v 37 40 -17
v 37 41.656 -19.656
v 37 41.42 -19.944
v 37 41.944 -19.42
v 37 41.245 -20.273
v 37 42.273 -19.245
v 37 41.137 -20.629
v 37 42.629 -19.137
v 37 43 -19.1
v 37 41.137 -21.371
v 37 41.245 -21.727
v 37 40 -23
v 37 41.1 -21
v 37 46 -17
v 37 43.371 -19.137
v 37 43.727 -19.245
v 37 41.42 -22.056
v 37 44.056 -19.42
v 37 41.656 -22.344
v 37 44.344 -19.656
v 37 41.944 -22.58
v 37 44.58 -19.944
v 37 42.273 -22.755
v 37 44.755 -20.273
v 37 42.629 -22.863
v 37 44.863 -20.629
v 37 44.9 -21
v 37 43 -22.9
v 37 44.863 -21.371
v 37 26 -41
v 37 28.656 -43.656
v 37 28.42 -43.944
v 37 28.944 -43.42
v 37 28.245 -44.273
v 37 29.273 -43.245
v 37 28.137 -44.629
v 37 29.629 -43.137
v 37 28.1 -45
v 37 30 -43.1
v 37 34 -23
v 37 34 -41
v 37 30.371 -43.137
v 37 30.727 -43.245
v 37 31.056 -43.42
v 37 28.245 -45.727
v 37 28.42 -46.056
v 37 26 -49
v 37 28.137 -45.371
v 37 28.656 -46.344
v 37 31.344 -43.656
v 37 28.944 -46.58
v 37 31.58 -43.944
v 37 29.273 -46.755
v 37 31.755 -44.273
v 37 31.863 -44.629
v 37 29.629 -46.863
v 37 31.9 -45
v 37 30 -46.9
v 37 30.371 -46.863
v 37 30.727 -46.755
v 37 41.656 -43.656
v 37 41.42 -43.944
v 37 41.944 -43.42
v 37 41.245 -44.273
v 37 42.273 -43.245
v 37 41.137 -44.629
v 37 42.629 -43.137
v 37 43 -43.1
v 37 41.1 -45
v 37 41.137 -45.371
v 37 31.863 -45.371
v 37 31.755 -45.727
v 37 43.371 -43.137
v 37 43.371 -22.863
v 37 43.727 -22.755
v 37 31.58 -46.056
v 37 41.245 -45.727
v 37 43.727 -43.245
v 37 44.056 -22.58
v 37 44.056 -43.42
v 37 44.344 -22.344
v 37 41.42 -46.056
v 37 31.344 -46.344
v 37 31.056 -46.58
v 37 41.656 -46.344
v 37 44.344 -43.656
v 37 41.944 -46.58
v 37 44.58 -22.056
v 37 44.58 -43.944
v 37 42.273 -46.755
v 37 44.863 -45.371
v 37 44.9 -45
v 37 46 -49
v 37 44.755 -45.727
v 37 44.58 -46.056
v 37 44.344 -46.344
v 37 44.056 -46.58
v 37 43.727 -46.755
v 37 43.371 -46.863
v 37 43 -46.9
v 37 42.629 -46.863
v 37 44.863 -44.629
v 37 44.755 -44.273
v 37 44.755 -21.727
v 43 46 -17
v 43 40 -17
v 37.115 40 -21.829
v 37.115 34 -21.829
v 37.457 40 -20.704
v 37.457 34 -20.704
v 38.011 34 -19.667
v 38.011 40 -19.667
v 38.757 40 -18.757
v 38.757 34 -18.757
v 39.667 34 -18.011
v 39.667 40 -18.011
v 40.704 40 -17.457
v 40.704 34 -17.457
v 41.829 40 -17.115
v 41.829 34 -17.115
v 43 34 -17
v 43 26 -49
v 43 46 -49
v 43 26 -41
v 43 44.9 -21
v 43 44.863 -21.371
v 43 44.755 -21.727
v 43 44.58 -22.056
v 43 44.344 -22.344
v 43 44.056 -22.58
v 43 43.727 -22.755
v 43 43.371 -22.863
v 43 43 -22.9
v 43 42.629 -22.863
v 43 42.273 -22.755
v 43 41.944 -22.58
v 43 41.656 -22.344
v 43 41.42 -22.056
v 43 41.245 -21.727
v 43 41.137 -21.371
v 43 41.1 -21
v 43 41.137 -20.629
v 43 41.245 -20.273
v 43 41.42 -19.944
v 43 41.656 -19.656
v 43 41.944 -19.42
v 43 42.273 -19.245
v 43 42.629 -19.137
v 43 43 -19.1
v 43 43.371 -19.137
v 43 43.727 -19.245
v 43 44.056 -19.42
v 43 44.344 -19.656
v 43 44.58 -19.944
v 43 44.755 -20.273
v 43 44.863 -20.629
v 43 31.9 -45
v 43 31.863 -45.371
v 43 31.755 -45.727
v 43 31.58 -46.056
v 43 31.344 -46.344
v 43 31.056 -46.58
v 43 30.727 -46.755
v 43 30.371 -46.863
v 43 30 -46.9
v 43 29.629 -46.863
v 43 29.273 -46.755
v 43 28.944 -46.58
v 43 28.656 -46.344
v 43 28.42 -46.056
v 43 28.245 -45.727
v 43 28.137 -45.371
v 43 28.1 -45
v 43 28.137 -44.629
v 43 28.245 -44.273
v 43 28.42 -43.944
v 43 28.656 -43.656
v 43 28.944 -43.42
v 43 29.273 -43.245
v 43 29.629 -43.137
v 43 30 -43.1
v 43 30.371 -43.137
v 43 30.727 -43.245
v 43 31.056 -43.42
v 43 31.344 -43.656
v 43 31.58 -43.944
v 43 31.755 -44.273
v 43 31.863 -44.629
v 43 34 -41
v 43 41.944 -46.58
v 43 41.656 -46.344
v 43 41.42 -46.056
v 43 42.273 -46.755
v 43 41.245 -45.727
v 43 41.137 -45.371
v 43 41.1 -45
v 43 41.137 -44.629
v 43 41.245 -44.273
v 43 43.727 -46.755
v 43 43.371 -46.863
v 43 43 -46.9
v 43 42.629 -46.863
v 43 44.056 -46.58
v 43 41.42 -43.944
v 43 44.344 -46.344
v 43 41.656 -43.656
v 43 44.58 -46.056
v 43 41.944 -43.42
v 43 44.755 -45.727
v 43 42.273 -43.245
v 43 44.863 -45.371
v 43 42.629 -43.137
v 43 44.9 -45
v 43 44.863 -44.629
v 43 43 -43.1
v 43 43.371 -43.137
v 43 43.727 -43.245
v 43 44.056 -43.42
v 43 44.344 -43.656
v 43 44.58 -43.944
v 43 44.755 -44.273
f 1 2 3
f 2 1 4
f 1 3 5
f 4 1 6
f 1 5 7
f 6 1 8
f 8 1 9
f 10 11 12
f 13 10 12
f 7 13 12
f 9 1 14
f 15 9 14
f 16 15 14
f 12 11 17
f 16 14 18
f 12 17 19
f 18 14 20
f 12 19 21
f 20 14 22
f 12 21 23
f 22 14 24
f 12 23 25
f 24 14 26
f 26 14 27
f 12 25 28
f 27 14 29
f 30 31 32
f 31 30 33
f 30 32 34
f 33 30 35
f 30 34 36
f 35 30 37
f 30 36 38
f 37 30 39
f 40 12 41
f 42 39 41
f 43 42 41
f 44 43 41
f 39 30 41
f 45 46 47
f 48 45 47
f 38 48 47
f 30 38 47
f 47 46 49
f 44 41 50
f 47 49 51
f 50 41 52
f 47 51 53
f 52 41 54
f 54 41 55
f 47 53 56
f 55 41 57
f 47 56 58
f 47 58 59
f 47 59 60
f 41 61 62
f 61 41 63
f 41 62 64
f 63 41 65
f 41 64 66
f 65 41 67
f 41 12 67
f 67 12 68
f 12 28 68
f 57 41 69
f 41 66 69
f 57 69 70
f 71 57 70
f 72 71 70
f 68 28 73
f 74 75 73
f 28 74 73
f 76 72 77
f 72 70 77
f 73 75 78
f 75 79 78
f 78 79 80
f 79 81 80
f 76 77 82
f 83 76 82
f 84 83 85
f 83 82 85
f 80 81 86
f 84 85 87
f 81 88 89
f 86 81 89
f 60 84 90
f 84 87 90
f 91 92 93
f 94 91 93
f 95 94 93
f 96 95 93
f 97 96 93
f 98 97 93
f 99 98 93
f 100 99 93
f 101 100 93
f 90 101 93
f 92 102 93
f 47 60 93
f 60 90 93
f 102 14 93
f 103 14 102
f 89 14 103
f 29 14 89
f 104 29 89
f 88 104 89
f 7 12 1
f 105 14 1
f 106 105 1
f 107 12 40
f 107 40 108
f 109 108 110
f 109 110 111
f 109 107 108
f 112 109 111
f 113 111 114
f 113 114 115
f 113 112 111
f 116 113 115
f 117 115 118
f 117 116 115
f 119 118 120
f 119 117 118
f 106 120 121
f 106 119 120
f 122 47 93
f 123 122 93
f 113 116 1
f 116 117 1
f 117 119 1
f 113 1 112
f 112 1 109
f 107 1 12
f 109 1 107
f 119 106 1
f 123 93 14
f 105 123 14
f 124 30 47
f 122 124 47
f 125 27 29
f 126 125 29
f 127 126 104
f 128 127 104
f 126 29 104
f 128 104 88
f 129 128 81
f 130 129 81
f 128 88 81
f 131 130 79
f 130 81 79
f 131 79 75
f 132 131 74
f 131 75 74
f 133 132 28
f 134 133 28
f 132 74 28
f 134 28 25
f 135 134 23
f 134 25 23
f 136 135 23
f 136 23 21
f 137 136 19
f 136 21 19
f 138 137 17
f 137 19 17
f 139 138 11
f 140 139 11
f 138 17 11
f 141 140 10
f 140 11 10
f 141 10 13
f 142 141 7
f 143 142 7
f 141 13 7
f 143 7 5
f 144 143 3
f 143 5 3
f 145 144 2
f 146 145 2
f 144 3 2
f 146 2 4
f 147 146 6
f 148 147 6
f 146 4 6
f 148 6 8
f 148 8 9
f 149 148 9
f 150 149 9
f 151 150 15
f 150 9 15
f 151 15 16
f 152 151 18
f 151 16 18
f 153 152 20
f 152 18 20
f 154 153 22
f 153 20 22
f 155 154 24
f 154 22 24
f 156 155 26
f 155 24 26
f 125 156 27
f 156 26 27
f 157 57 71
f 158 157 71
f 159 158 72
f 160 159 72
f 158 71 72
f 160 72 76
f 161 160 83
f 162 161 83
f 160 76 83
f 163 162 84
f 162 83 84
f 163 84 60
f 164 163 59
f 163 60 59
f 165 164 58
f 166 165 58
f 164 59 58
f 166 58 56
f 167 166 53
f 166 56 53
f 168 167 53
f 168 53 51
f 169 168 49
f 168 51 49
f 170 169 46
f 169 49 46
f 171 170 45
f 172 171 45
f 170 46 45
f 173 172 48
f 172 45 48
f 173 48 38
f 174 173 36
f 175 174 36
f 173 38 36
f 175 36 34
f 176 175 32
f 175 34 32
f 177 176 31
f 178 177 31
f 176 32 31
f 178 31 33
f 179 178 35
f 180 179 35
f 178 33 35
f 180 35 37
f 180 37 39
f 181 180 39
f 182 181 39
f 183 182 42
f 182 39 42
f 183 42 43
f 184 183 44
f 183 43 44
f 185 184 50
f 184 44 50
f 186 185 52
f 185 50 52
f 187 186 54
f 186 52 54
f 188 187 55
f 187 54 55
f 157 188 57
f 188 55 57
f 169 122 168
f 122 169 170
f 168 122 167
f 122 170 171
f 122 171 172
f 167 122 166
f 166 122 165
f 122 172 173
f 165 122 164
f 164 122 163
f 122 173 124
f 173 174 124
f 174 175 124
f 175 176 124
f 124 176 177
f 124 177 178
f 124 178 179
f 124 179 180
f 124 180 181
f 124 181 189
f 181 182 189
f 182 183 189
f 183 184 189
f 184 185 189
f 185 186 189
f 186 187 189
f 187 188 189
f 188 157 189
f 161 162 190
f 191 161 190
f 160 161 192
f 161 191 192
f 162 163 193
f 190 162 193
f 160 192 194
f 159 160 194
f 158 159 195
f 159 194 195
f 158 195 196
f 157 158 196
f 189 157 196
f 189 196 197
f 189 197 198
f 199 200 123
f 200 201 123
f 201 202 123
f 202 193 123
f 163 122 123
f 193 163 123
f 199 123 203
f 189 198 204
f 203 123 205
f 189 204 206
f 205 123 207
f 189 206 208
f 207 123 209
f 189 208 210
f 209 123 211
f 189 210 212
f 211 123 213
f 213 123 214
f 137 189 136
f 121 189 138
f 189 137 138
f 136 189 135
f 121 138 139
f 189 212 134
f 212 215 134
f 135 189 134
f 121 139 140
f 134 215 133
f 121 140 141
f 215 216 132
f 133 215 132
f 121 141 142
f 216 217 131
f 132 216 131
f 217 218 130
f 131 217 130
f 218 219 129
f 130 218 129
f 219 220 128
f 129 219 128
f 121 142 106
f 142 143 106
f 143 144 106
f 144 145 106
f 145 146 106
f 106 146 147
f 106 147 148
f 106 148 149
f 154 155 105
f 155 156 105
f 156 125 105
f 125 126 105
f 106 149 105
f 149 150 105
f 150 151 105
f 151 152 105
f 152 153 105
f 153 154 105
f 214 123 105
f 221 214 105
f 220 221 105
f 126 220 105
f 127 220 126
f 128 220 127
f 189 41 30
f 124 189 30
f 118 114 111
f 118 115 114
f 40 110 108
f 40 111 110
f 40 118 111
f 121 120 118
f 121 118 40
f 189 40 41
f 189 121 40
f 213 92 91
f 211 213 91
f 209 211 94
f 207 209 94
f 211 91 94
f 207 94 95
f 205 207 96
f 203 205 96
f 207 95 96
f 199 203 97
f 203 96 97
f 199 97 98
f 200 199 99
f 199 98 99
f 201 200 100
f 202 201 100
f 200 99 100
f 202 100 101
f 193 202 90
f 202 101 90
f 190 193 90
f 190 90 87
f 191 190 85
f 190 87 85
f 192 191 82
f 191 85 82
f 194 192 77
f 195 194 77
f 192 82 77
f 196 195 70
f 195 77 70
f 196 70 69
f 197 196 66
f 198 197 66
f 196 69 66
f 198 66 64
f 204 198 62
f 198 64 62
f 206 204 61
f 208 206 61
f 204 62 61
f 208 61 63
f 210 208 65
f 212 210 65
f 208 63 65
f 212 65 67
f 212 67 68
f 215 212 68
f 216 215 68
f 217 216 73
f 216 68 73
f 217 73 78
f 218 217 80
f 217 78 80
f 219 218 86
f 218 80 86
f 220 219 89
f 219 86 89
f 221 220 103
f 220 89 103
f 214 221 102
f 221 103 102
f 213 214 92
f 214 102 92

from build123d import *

# Parameters (mm, degrees)
SKETCH024_R  = 1.9
PAD015_DEPTH = 6
PAD016_DEPTH = 6


with BuildPart() as pad016:
    # Sketch024 → Pad015 (new body)
    with BuildSketch(Plane(origin=(-37, 0, 0), x_dir=(0, 1, 0), z_dir=(-1, 0, 0))):
        Polygon((46, 17), (40, 17), (40, 41), (26, 41), (26, 49), (46, 49), align=None)
        with Locations((43, 21)):
            Circle(SKETCH024_R, mode=Mode.SUBTRACT)
        with Locations((30, 45)):
            Circle(SKETCH024_R, mode=Mode.SUBTRACT)
        with Locations((43, 45)):
            Circle(SKETCH024_R, mode=Mode.SUBTRACT)
    extrude(amount=PAD015_DEPTH)

    # Sketch025 → Pad016 (new body)
    with BuildSketch(Plane(origin=(-37, 40, 0), x_dir=(0, 0, 1), z_dir=(0, -1, 0))):
        with BuildLine():
            Line((-41, 6), (-17, 6))
            ThreePointArc((-22.999973, 0), (-18.75735, 1.757369), (-17, 6))
            Line((-22.999973, 0), (-41, 0))
            Line((-41, 0), (-41, 6))
        make_face()
    extrude(amount=PAD016_DEPTH)


with BuildPart() as part_mirroring001:
    # Part__Mirroring001: instance of Pad016
    add(pad016.part.mirror(Plane(origin=(0, 0, 0), x_dir=(0, -1, 0), z_dir=(1, 0, 0))))


solid = part_mirroring001.part
